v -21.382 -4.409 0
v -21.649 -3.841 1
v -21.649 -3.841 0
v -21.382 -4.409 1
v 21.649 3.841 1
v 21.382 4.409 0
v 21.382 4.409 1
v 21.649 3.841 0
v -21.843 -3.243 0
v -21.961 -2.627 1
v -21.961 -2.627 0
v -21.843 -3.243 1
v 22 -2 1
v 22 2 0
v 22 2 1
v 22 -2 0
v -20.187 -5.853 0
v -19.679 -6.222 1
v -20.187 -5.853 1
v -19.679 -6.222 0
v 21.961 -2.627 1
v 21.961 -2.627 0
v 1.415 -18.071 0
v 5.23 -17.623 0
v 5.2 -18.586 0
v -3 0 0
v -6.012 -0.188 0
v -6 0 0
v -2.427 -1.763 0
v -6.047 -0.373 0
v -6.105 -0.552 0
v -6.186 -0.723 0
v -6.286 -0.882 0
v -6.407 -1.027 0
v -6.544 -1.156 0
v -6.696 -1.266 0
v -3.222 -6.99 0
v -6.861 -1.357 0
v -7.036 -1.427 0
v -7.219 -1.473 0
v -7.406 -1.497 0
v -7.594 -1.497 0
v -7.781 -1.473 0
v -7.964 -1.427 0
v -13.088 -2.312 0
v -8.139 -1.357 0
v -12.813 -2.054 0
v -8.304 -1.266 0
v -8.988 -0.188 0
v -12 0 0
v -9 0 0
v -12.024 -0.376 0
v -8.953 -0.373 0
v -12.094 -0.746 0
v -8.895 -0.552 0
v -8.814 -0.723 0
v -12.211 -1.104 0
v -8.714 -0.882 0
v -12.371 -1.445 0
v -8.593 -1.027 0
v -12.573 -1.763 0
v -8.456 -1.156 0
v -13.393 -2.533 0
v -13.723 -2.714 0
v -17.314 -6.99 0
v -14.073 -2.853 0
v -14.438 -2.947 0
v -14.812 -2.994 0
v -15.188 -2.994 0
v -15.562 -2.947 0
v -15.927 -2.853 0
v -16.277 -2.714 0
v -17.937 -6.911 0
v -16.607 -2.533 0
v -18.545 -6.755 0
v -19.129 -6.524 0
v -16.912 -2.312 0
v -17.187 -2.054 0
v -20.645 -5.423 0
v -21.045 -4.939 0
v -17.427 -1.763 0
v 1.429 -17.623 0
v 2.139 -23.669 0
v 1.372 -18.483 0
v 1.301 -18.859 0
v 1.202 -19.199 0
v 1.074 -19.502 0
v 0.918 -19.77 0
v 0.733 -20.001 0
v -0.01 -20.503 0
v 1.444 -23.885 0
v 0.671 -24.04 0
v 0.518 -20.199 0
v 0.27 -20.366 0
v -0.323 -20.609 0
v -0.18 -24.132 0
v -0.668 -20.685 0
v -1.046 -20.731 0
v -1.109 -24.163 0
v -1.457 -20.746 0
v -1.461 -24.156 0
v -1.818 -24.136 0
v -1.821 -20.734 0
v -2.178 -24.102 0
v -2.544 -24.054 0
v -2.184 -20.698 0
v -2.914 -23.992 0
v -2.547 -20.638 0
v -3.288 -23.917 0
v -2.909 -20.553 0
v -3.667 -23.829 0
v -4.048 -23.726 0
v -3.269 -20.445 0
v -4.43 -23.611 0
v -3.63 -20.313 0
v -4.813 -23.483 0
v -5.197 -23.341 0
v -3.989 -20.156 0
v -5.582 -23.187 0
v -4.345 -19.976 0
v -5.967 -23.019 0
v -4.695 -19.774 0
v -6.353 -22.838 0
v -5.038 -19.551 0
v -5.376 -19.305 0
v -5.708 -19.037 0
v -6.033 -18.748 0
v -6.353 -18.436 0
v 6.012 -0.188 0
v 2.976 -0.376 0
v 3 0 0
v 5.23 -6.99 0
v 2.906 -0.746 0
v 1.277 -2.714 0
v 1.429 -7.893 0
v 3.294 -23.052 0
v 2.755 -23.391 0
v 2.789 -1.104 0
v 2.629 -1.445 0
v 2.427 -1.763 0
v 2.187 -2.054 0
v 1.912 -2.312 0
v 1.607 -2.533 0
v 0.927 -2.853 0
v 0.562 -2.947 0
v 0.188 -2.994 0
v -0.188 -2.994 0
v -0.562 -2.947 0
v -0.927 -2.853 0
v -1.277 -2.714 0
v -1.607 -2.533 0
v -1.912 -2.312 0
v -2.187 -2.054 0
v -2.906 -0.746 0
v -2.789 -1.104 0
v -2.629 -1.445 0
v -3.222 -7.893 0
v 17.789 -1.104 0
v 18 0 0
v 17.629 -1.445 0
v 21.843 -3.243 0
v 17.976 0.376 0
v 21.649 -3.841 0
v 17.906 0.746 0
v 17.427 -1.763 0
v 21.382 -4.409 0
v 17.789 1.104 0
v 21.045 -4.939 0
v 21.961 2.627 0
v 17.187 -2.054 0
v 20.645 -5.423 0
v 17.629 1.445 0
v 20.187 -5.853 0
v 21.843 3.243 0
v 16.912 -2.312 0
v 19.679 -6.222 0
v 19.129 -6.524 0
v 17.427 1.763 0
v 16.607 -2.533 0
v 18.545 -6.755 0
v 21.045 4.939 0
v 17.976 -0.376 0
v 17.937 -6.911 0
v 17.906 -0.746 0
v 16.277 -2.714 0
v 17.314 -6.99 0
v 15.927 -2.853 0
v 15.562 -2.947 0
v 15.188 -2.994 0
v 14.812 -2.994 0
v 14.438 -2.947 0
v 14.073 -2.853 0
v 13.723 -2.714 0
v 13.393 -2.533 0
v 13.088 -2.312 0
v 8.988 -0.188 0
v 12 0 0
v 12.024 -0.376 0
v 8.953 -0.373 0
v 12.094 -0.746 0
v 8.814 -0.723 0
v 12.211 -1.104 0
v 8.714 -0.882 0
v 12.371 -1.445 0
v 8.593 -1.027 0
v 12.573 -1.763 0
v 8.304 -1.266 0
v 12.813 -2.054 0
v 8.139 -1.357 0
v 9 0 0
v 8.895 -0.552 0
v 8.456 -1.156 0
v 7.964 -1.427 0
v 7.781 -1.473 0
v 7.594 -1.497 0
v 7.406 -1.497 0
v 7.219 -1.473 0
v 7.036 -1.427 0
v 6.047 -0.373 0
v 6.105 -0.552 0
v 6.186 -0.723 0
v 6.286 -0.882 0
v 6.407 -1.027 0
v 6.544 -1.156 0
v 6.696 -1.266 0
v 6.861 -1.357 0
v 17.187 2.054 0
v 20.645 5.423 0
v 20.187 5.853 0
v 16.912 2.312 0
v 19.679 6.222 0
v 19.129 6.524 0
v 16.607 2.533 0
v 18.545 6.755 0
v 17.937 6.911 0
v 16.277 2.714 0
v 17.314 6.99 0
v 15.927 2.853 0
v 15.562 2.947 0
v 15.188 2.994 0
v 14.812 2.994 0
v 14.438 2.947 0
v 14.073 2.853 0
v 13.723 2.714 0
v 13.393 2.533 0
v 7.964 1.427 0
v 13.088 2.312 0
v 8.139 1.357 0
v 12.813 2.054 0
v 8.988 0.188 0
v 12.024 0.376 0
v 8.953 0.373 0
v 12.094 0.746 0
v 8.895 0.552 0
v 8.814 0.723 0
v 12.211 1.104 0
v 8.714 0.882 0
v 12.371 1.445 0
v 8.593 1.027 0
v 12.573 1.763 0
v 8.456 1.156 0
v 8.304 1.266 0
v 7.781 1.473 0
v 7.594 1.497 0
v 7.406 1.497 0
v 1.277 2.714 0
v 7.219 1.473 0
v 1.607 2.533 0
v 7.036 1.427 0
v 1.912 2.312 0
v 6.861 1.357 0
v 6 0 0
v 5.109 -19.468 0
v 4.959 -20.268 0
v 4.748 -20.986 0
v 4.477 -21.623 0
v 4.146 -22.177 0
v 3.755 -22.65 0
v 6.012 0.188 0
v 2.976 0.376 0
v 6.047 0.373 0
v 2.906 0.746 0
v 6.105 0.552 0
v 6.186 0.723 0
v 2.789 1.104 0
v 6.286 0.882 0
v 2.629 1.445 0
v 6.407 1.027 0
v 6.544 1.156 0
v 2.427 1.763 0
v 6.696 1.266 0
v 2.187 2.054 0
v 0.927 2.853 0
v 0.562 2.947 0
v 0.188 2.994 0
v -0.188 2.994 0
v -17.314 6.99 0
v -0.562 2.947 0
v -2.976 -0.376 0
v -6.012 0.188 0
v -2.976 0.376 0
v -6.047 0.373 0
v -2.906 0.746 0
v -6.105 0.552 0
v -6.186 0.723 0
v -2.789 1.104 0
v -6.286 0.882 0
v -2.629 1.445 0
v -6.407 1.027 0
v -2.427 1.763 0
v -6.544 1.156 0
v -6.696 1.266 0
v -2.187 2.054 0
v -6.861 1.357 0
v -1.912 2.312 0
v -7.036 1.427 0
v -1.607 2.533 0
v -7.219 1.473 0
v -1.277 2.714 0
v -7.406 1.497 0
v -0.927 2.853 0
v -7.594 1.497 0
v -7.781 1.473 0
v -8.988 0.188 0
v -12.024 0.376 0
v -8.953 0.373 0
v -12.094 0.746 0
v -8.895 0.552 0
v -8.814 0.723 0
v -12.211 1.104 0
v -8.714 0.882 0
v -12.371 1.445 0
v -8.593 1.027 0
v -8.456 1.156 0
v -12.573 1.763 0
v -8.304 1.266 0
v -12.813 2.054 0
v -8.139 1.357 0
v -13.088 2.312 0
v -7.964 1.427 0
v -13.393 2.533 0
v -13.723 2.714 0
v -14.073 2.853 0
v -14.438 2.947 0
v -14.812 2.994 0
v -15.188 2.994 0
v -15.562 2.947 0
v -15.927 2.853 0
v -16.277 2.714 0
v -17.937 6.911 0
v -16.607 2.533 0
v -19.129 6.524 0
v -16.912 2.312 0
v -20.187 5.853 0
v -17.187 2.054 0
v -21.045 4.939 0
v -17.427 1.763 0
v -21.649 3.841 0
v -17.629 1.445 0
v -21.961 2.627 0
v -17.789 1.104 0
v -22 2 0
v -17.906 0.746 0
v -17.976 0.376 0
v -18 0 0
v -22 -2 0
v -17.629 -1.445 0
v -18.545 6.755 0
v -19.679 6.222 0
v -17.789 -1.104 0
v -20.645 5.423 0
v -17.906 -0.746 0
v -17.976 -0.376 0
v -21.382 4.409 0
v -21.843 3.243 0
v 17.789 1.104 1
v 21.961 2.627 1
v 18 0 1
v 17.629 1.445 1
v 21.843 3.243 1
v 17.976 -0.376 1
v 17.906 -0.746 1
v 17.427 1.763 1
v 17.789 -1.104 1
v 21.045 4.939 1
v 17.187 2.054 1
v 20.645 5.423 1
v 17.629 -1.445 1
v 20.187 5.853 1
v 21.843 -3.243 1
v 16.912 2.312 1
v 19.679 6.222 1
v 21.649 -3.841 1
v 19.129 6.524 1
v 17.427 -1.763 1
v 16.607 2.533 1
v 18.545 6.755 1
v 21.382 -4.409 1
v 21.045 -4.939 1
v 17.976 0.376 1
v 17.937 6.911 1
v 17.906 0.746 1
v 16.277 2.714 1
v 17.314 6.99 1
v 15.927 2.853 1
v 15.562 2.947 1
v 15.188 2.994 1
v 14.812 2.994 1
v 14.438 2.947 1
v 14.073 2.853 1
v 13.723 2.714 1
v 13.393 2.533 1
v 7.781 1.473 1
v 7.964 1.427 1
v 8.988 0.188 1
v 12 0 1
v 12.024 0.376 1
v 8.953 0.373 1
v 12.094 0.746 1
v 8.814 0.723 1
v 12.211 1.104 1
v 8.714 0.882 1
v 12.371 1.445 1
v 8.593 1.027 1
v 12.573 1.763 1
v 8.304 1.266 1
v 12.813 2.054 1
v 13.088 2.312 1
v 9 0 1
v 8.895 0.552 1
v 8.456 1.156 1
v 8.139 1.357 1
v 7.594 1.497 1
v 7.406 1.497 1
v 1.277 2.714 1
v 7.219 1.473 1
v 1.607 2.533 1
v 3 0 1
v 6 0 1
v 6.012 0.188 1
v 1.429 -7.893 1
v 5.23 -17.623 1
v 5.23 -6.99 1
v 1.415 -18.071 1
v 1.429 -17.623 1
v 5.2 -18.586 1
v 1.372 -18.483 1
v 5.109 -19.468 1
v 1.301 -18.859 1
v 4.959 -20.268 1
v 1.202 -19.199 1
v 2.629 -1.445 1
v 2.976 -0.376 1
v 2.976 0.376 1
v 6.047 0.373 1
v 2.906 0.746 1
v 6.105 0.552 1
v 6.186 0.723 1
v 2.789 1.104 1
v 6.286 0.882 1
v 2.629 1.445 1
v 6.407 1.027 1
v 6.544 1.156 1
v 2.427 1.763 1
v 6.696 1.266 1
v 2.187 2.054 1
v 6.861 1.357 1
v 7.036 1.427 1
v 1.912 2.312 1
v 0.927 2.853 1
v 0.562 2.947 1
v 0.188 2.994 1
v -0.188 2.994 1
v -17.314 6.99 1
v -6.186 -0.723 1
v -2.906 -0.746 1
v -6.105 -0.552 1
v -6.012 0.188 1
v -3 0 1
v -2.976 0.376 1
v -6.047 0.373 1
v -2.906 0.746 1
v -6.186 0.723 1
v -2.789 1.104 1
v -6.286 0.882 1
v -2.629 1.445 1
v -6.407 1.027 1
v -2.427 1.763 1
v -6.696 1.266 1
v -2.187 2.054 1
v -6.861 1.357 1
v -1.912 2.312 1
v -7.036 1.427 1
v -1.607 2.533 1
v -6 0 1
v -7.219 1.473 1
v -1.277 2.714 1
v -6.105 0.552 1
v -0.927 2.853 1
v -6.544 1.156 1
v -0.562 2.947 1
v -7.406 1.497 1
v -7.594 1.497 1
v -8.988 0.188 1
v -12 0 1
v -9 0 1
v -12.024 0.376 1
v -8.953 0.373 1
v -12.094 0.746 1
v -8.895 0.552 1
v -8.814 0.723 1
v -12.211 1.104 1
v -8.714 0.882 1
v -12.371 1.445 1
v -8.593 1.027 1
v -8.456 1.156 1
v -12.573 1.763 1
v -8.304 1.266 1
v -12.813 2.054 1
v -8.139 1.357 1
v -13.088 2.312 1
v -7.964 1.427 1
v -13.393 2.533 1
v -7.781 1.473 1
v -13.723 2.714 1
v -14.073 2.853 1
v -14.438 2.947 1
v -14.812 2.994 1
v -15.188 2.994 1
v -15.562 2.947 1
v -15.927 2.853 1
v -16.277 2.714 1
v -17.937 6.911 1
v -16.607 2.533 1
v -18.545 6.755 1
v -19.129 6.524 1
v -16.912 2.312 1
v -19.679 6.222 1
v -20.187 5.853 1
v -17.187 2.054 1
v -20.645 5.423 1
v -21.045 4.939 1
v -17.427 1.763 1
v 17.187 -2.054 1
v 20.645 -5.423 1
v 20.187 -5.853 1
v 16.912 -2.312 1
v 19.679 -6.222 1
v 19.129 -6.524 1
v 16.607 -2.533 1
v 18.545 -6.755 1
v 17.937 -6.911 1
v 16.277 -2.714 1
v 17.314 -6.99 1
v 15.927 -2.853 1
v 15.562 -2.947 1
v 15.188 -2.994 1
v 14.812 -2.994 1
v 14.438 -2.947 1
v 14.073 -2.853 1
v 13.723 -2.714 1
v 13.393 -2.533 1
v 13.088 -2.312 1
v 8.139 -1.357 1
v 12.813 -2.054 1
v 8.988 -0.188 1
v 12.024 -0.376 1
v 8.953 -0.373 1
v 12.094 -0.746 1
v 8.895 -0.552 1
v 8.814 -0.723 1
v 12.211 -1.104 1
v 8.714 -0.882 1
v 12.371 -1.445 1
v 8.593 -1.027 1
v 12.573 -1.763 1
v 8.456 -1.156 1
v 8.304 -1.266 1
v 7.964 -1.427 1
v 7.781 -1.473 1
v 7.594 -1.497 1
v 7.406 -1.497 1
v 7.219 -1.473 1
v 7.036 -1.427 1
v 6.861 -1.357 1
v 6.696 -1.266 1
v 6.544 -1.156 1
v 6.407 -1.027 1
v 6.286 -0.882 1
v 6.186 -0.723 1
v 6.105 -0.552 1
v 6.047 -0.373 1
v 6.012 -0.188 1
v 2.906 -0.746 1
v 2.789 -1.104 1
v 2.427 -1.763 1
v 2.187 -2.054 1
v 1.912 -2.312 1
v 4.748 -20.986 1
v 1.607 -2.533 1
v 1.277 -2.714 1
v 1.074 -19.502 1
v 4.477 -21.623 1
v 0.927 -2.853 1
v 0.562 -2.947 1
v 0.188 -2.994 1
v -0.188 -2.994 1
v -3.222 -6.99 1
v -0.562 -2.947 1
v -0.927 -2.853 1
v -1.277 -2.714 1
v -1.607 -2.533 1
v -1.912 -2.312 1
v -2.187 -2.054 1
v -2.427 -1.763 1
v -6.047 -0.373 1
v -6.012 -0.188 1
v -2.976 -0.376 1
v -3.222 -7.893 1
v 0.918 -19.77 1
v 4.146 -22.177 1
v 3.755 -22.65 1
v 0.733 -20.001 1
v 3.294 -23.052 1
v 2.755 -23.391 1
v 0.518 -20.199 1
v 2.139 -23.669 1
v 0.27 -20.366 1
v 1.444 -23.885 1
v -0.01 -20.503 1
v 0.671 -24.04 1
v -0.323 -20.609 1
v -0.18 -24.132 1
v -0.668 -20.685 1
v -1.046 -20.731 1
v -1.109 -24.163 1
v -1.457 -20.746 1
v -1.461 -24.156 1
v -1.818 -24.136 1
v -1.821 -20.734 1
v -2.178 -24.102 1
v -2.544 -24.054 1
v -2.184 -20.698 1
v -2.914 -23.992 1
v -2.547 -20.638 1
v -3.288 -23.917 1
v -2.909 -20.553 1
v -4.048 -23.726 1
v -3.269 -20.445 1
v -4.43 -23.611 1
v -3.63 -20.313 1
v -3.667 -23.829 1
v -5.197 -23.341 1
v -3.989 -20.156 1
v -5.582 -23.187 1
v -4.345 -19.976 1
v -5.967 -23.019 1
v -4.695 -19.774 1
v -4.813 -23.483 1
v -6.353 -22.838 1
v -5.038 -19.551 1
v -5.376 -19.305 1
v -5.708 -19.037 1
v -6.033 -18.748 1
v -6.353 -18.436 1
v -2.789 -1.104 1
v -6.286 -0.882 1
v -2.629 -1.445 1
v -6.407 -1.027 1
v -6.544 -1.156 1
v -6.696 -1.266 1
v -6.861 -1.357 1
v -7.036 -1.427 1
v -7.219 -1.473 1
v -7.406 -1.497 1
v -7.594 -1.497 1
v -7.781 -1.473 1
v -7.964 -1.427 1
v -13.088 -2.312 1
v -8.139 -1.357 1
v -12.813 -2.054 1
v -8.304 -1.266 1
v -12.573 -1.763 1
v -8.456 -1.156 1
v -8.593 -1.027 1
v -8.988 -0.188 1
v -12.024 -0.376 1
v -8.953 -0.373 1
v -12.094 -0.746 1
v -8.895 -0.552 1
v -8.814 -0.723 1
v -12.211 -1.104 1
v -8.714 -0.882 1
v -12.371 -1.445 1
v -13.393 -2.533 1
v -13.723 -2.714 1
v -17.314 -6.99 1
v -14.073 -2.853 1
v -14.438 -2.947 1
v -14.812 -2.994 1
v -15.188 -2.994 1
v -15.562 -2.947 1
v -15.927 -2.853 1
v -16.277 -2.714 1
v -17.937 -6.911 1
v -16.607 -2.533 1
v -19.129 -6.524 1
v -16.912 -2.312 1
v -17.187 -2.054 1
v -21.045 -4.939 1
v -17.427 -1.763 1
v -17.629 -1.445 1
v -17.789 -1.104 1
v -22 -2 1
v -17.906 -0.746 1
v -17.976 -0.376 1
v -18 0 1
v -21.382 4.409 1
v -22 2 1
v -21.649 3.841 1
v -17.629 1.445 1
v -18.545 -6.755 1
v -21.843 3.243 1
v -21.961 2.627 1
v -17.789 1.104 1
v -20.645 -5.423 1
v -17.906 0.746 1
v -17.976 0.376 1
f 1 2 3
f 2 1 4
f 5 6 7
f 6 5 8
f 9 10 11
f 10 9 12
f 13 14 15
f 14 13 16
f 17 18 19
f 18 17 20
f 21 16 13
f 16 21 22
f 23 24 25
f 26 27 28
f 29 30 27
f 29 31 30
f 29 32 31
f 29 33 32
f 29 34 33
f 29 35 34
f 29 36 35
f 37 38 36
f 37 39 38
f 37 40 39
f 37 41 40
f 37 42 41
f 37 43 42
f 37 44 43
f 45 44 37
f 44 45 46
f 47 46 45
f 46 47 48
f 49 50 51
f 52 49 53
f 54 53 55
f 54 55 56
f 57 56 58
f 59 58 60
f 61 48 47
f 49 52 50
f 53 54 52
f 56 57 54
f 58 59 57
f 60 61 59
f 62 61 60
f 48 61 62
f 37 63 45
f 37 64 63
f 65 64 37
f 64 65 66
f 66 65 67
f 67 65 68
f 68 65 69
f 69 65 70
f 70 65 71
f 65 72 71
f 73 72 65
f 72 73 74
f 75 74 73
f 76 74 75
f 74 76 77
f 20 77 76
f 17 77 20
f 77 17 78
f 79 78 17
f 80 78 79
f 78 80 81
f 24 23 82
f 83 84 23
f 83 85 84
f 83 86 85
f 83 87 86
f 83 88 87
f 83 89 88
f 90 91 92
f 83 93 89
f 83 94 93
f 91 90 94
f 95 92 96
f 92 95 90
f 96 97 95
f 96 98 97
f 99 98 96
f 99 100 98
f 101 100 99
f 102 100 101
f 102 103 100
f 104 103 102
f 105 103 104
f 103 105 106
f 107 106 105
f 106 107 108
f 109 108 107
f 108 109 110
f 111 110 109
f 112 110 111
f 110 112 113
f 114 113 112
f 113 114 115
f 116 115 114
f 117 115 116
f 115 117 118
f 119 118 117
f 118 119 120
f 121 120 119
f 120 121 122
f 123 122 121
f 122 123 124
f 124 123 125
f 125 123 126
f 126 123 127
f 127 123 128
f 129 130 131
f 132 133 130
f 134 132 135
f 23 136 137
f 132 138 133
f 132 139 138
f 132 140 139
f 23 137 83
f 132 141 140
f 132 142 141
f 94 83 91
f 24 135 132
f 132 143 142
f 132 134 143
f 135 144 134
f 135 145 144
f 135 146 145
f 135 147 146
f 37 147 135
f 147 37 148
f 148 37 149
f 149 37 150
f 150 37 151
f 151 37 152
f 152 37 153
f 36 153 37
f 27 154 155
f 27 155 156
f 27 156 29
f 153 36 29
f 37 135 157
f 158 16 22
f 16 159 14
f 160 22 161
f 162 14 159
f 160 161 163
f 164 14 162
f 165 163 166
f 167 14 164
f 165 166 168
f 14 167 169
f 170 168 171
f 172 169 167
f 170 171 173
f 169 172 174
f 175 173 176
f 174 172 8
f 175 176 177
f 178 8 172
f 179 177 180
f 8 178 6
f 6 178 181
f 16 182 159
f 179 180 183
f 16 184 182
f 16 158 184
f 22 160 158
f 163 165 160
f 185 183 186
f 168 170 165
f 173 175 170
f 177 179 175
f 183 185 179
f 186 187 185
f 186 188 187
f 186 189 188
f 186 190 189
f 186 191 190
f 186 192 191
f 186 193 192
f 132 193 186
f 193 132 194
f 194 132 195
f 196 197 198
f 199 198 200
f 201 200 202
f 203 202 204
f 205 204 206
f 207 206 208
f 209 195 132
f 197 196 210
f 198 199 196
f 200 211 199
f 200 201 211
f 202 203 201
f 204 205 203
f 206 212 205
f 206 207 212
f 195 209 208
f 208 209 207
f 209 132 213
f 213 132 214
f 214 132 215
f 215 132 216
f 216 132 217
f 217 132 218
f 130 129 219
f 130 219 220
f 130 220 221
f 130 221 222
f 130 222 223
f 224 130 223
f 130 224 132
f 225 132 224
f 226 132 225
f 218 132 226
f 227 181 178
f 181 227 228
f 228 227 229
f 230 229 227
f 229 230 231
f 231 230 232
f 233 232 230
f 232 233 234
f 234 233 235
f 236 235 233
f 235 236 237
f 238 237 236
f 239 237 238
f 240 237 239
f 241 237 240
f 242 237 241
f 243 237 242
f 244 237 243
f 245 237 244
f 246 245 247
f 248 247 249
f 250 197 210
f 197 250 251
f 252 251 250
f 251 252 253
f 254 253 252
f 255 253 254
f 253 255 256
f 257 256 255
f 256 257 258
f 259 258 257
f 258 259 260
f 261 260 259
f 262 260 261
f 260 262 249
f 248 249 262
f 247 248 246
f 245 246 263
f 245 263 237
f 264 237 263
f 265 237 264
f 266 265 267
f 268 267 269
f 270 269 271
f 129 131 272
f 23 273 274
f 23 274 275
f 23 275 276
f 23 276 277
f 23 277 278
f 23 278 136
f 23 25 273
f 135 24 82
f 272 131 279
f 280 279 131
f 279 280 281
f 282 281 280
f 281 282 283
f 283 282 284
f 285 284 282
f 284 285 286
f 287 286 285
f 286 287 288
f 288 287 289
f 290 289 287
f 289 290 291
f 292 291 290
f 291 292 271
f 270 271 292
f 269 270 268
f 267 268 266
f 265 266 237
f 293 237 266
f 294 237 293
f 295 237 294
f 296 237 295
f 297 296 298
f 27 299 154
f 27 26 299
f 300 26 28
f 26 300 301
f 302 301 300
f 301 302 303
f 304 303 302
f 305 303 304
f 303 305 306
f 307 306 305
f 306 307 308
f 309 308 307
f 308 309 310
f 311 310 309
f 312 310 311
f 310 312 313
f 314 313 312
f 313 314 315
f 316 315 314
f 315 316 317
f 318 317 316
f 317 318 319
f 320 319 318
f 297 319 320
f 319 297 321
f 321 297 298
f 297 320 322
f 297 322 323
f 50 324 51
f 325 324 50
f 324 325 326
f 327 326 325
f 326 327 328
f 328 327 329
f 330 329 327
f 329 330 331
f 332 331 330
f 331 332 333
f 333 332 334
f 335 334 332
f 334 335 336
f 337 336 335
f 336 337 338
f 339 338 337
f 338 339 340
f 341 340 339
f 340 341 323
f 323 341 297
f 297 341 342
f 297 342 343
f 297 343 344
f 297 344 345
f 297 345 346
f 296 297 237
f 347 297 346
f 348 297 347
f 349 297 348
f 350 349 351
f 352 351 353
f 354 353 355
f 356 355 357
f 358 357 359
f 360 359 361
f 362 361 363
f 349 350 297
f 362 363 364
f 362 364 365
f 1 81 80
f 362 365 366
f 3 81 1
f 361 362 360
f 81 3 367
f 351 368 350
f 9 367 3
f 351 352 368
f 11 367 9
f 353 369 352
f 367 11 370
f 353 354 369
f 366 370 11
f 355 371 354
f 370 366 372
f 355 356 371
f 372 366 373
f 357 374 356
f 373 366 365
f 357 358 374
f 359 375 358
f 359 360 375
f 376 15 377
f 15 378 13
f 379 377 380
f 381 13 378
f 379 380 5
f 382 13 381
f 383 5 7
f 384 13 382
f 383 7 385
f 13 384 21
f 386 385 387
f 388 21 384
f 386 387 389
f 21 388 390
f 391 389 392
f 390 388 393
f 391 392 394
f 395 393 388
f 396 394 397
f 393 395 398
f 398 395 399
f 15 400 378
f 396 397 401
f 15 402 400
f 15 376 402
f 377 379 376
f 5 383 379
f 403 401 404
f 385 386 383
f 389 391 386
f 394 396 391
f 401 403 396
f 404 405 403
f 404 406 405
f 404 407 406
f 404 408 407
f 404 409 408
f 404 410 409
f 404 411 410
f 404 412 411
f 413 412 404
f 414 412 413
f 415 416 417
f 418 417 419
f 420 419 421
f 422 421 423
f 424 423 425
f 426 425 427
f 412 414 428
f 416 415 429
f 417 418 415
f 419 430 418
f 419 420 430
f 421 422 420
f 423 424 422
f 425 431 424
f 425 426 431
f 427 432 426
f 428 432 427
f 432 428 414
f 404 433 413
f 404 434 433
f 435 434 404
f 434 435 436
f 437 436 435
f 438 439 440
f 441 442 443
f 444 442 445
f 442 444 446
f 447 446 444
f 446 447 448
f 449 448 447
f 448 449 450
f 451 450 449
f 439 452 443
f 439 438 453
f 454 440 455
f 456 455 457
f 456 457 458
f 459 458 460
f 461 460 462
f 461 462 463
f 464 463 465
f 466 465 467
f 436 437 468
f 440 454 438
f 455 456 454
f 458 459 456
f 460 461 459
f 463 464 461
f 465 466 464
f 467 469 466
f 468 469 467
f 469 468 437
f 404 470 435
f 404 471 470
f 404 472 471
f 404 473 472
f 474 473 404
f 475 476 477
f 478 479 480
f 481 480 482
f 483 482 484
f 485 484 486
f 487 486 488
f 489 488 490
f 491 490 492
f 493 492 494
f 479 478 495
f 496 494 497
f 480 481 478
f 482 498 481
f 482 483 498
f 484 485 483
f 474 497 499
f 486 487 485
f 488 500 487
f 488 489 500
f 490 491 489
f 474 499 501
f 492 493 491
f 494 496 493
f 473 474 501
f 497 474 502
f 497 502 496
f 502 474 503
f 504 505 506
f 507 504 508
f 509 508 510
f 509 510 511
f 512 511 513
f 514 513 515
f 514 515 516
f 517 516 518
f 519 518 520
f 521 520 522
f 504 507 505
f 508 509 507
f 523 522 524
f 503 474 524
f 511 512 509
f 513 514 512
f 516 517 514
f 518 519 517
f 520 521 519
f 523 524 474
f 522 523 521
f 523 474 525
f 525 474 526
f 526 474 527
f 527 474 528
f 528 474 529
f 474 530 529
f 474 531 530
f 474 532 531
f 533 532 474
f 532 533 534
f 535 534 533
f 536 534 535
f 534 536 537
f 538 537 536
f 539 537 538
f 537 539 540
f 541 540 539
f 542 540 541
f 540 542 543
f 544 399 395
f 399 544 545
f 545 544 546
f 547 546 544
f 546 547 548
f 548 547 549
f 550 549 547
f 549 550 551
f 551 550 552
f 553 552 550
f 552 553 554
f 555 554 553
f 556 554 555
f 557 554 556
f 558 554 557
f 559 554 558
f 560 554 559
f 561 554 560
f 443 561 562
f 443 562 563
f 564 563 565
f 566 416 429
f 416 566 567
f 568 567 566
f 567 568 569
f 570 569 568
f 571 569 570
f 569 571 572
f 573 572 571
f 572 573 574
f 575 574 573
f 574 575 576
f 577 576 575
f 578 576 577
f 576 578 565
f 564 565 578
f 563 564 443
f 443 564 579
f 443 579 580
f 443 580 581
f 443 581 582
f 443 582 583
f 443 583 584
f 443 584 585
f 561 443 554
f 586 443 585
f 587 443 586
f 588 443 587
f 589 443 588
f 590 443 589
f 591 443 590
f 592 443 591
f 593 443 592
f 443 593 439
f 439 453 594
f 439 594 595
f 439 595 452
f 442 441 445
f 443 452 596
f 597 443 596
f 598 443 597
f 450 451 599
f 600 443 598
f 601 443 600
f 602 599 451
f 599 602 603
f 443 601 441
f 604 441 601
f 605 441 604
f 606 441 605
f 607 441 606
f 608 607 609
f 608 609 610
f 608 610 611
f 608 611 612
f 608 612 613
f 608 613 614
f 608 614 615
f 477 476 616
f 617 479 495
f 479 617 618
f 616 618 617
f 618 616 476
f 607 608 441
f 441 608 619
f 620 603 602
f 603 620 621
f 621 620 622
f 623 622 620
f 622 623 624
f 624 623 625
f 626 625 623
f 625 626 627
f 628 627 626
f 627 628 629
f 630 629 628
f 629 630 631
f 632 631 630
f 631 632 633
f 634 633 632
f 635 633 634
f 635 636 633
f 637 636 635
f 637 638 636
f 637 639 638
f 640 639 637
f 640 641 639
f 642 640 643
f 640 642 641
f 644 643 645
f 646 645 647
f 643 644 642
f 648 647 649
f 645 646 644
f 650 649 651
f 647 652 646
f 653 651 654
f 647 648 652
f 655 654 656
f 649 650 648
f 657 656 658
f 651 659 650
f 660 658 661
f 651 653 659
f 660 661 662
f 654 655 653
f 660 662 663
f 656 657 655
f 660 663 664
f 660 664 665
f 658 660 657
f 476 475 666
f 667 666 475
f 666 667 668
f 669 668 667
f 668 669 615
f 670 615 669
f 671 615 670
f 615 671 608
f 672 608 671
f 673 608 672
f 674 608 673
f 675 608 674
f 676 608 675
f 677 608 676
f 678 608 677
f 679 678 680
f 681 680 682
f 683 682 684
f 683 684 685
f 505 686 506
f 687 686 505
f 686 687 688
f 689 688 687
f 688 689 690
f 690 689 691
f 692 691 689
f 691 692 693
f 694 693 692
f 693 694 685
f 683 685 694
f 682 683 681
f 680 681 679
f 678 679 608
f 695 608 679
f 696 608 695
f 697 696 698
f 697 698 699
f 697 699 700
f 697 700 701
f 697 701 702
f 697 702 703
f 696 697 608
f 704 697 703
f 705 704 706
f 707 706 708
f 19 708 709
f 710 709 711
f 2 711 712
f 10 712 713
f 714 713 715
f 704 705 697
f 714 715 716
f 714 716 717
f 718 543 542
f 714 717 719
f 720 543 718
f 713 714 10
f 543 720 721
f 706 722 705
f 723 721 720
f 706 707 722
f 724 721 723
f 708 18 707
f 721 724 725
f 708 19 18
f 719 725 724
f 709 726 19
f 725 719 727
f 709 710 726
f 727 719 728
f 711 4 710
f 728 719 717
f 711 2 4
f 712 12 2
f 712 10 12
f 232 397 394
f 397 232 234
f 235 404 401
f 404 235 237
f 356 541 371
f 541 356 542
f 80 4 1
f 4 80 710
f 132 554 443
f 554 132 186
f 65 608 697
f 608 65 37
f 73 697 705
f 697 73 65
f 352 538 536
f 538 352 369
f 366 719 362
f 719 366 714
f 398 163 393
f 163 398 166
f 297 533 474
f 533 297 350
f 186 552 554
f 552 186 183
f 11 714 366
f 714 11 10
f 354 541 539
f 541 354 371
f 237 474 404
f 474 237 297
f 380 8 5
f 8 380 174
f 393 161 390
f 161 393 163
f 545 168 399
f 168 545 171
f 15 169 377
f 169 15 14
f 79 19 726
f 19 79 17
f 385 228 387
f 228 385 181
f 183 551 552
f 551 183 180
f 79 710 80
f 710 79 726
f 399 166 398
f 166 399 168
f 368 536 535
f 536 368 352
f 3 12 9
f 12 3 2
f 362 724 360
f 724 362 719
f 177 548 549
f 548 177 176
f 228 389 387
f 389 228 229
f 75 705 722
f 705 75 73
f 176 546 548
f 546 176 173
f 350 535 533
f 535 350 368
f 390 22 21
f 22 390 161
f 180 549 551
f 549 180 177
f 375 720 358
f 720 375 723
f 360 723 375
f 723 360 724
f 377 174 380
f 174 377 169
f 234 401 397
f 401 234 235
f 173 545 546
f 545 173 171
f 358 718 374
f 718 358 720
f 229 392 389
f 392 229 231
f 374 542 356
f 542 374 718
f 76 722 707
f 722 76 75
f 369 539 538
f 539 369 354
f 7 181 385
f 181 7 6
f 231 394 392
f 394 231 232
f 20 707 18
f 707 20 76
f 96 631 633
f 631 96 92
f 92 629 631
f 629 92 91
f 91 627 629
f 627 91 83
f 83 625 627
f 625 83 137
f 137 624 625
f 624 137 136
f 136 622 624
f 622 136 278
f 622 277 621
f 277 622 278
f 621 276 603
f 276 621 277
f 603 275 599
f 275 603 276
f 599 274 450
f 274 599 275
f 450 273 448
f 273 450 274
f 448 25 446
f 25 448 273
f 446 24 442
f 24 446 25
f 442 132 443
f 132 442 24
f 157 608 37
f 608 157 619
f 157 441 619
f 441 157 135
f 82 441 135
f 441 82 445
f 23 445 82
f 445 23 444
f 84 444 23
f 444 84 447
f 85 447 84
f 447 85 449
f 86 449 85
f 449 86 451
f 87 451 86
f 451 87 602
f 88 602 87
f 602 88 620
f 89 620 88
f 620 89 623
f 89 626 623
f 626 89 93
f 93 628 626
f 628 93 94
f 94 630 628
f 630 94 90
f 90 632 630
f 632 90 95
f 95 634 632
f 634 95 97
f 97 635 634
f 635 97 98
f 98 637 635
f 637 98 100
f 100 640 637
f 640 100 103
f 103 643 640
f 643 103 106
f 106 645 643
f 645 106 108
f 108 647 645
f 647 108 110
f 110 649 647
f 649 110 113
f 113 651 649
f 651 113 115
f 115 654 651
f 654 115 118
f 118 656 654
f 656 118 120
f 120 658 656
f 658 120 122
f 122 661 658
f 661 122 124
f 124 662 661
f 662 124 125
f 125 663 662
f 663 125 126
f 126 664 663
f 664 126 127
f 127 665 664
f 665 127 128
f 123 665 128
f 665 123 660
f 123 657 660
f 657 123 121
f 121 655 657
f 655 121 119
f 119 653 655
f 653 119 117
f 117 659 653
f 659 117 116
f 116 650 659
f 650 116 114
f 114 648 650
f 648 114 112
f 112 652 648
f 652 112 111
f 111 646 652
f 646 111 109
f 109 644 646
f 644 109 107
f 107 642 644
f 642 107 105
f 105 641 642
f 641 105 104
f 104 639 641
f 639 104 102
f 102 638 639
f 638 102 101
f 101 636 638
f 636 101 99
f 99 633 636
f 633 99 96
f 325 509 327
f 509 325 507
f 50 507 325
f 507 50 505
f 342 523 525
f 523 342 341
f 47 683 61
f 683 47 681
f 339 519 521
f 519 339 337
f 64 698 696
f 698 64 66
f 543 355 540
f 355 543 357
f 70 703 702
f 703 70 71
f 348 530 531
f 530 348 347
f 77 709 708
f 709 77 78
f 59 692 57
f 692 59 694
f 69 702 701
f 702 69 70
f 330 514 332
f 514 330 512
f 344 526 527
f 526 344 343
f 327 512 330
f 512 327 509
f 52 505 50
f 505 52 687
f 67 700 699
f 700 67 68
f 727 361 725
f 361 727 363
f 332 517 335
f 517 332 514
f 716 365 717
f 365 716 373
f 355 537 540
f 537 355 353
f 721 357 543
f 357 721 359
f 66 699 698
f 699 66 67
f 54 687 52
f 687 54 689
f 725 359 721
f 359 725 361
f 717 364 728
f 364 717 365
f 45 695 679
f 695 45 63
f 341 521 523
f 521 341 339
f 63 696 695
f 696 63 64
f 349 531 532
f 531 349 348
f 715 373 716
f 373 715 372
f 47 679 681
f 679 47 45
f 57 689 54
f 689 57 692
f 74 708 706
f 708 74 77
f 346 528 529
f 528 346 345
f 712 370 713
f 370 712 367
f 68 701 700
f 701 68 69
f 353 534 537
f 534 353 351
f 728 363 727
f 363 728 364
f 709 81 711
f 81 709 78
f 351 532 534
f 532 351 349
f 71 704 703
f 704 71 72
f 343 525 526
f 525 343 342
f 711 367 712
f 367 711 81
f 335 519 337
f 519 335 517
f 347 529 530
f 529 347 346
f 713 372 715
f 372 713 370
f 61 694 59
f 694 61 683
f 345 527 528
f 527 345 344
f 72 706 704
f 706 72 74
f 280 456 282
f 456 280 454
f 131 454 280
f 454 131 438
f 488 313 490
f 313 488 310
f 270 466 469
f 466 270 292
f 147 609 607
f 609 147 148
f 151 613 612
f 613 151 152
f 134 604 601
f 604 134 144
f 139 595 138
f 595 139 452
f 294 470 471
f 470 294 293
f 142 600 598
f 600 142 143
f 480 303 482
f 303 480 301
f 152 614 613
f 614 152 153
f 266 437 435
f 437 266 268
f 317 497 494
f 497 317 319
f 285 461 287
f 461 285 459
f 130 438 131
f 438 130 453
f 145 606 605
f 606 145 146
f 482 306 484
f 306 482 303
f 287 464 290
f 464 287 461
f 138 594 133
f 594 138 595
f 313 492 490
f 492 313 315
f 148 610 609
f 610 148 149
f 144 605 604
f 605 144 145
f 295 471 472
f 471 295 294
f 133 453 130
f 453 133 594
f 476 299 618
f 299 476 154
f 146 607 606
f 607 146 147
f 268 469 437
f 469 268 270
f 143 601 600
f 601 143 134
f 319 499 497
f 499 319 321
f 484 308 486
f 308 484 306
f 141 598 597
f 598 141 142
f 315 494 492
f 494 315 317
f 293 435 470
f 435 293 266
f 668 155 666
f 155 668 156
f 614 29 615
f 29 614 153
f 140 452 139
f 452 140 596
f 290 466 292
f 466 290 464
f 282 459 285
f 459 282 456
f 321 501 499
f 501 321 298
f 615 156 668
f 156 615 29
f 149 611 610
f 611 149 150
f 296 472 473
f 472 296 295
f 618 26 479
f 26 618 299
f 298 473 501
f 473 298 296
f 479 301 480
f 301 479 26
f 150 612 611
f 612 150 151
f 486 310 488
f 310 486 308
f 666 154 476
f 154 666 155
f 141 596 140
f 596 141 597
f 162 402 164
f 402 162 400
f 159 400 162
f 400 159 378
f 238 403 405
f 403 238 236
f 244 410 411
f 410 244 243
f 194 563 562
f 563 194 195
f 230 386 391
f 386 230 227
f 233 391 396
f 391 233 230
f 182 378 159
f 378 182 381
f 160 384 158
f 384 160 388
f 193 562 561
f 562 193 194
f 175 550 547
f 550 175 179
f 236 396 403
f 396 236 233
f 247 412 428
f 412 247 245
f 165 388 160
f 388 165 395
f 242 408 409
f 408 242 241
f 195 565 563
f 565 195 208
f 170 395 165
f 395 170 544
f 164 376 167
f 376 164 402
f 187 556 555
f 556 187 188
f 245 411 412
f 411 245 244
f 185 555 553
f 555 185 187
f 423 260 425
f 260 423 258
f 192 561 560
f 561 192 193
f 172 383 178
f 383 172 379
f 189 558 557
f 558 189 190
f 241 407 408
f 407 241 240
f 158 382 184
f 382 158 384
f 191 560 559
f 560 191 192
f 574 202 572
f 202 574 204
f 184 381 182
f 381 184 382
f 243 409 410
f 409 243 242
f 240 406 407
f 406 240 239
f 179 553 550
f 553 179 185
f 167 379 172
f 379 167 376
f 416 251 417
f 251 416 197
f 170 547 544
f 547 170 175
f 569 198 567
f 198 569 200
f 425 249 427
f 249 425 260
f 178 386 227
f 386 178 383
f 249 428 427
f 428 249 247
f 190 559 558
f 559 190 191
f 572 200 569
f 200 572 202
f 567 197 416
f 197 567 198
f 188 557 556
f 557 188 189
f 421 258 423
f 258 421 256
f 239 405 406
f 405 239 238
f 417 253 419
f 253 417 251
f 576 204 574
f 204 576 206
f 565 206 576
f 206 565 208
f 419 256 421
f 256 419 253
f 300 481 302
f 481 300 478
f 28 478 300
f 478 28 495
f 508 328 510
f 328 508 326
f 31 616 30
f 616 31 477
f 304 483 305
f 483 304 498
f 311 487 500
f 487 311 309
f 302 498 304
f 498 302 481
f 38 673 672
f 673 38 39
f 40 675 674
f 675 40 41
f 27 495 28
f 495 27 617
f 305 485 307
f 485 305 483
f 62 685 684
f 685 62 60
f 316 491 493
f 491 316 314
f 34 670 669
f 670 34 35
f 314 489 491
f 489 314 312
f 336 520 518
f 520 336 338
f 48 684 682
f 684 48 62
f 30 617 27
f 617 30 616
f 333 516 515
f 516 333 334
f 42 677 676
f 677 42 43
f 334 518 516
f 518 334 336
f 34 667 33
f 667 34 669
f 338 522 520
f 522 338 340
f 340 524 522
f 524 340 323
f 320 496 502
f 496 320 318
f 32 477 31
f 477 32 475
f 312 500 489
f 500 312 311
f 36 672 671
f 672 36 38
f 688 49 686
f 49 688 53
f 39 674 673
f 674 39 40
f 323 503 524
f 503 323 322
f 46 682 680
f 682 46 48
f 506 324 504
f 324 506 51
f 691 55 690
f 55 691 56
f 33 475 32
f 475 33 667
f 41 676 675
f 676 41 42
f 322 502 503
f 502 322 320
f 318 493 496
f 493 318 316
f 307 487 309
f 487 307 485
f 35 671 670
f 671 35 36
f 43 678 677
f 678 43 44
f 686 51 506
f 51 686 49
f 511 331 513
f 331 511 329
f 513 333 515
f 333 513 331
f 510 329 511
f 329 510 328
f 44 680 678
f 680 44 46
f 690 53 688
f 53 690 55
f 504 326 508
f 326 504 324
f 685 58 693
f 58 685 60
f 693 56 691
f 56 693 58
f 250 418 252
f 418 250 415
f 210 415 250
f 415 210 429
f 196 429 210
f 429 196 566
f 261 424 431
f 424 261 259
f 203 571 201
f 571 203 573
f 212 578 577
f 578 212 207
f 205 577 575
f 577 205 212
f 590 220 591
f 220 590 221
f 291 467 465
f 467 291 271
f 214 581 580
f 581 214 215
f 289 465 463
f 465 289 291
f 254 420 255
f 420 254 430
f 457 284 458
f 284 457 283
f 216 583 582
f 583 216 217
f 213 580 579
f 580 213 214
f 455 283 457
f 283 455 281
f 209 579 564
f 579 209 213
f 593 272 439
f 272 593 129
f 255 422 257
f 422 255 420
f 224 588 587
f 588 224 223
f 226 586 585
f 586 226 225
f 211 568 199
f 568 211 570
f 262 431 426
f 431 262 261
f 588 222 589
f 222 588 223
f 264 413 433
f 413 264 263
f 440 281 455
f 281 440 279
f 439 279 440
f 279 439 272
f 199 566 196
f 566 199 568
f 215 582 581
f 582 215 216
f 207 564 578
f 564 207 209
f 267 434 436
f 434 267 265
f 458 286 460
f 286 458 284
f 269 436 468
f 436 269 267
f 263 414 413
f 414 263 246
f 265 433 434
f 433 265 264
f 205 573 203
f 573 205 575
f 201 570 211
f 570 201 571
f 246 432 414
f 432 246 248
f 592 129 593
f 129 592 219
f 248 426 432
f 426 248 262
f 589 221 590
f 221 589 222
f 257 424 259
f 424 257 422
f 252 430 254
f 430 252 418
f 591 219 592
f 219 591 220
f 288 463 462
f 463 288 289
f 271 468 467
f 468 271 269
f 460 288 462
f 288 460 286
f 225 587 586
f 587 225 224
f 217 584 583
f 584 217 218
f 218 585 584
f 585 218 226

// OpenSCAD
$fn = 50;


difference() {
	union() {
		*color(alpha = 1.0000000000, c = "gray") {
			translate(v = [0, 14, 0]) {
				linear_extrude(height = 1) {
					text(font = "Arial:style=Bold", halign = "center", size = 4.5000000000, text = "COMMENT description oobb_plate_shape_p_type_1_depth_3_width_1_thickness_j_extra_oobb_size", valign = "center");
				}
			}
		}
		hull() {
			translate(v = [-17.0000000000, 2.0000000000, 0]) {
				cylinder(h = 1, r = 5);
			}
			translate(v = [17.0000000000, 2.0000000000, 0]) {
				cylinder(h = 1, r = 5);
			}
			translate(v = [-17.0000000000, -2.0000000000, 0]) {
				cylinder(h = 1, r = 5);
			}
			translate(v = [17.0000000000, -2.0000000000, 0]) {
				cylinder(h = 1, r = 5);
			}
		}
		translate(v = [0, -5, 0]) {
			linear_extrude(height = 1) {
				text(font = "DejaVu Sans Mono:style=Bold", halign = "center", size = 19.0000000000, text = "J", valign = "top");
			}
		}
	}
	union() {
		*color(alpha = 1.0000000000, c = "gray") {
			translate(v = [0, 14, 0]) {
				linear_extrude(height = 1) {
					text(font = "Arial:style=Bold", halign = "center", size = 4.5000000000, text = "COMMENT description oobb_holes_shape_n_type_3_width_1_thickness_j_extra_oobb_size_1_height_'all'_holes_true_both_holes", valign = "center");
				}
			}
		}
		translate(v = [-15.0000000000, 0.0000000000, 0]) {
			translate(v = [0, 0, -50]) {
				cylinder(h = 100, r = 3.0000000000);
			}
		}
		translate(v = [0, 0, -50]) {
			cylinder(h = 100, r = 3.0000000000);
		}
		translate(v = [15.0000000000, 0.0000000000, 0]) {
			translate(v = [0, 0, -50]) {
				cylinder(h = 100, r = 3.0000000000);
			}
		}
		translate(v = [-15.0000000000, 0.0000000000, 0]) {
			translate(v = [0, 0, -50]) {
				cylinder(h = 100, r = 1.5000000000);
			}
		}
		translate(v = [-7.5000000000, 0.0000000000, 0]) {
			translate(v = [0, 0, -50]) {
				cylinder(h = 100, r = 1.5000000000);
			}
		}
		translate(v = [0, 0, -50]) {
			cylinder(h = 100, r = 1.5000000000);
		}
		translate(v = [7.5000000000, 0.0000000000, 0]) {
			translate(v = [0, 0, -50]) {
				cylinder(h = 100, r = 1.5000000000);
			}
		}
		translate(v = [15.0000000000, 0.0000000000, 0]) {
			translate(v = [0, 0, -50]) {
				cylinder(h = 100, r = 1.5000000000);
			}
		}
	}
}
